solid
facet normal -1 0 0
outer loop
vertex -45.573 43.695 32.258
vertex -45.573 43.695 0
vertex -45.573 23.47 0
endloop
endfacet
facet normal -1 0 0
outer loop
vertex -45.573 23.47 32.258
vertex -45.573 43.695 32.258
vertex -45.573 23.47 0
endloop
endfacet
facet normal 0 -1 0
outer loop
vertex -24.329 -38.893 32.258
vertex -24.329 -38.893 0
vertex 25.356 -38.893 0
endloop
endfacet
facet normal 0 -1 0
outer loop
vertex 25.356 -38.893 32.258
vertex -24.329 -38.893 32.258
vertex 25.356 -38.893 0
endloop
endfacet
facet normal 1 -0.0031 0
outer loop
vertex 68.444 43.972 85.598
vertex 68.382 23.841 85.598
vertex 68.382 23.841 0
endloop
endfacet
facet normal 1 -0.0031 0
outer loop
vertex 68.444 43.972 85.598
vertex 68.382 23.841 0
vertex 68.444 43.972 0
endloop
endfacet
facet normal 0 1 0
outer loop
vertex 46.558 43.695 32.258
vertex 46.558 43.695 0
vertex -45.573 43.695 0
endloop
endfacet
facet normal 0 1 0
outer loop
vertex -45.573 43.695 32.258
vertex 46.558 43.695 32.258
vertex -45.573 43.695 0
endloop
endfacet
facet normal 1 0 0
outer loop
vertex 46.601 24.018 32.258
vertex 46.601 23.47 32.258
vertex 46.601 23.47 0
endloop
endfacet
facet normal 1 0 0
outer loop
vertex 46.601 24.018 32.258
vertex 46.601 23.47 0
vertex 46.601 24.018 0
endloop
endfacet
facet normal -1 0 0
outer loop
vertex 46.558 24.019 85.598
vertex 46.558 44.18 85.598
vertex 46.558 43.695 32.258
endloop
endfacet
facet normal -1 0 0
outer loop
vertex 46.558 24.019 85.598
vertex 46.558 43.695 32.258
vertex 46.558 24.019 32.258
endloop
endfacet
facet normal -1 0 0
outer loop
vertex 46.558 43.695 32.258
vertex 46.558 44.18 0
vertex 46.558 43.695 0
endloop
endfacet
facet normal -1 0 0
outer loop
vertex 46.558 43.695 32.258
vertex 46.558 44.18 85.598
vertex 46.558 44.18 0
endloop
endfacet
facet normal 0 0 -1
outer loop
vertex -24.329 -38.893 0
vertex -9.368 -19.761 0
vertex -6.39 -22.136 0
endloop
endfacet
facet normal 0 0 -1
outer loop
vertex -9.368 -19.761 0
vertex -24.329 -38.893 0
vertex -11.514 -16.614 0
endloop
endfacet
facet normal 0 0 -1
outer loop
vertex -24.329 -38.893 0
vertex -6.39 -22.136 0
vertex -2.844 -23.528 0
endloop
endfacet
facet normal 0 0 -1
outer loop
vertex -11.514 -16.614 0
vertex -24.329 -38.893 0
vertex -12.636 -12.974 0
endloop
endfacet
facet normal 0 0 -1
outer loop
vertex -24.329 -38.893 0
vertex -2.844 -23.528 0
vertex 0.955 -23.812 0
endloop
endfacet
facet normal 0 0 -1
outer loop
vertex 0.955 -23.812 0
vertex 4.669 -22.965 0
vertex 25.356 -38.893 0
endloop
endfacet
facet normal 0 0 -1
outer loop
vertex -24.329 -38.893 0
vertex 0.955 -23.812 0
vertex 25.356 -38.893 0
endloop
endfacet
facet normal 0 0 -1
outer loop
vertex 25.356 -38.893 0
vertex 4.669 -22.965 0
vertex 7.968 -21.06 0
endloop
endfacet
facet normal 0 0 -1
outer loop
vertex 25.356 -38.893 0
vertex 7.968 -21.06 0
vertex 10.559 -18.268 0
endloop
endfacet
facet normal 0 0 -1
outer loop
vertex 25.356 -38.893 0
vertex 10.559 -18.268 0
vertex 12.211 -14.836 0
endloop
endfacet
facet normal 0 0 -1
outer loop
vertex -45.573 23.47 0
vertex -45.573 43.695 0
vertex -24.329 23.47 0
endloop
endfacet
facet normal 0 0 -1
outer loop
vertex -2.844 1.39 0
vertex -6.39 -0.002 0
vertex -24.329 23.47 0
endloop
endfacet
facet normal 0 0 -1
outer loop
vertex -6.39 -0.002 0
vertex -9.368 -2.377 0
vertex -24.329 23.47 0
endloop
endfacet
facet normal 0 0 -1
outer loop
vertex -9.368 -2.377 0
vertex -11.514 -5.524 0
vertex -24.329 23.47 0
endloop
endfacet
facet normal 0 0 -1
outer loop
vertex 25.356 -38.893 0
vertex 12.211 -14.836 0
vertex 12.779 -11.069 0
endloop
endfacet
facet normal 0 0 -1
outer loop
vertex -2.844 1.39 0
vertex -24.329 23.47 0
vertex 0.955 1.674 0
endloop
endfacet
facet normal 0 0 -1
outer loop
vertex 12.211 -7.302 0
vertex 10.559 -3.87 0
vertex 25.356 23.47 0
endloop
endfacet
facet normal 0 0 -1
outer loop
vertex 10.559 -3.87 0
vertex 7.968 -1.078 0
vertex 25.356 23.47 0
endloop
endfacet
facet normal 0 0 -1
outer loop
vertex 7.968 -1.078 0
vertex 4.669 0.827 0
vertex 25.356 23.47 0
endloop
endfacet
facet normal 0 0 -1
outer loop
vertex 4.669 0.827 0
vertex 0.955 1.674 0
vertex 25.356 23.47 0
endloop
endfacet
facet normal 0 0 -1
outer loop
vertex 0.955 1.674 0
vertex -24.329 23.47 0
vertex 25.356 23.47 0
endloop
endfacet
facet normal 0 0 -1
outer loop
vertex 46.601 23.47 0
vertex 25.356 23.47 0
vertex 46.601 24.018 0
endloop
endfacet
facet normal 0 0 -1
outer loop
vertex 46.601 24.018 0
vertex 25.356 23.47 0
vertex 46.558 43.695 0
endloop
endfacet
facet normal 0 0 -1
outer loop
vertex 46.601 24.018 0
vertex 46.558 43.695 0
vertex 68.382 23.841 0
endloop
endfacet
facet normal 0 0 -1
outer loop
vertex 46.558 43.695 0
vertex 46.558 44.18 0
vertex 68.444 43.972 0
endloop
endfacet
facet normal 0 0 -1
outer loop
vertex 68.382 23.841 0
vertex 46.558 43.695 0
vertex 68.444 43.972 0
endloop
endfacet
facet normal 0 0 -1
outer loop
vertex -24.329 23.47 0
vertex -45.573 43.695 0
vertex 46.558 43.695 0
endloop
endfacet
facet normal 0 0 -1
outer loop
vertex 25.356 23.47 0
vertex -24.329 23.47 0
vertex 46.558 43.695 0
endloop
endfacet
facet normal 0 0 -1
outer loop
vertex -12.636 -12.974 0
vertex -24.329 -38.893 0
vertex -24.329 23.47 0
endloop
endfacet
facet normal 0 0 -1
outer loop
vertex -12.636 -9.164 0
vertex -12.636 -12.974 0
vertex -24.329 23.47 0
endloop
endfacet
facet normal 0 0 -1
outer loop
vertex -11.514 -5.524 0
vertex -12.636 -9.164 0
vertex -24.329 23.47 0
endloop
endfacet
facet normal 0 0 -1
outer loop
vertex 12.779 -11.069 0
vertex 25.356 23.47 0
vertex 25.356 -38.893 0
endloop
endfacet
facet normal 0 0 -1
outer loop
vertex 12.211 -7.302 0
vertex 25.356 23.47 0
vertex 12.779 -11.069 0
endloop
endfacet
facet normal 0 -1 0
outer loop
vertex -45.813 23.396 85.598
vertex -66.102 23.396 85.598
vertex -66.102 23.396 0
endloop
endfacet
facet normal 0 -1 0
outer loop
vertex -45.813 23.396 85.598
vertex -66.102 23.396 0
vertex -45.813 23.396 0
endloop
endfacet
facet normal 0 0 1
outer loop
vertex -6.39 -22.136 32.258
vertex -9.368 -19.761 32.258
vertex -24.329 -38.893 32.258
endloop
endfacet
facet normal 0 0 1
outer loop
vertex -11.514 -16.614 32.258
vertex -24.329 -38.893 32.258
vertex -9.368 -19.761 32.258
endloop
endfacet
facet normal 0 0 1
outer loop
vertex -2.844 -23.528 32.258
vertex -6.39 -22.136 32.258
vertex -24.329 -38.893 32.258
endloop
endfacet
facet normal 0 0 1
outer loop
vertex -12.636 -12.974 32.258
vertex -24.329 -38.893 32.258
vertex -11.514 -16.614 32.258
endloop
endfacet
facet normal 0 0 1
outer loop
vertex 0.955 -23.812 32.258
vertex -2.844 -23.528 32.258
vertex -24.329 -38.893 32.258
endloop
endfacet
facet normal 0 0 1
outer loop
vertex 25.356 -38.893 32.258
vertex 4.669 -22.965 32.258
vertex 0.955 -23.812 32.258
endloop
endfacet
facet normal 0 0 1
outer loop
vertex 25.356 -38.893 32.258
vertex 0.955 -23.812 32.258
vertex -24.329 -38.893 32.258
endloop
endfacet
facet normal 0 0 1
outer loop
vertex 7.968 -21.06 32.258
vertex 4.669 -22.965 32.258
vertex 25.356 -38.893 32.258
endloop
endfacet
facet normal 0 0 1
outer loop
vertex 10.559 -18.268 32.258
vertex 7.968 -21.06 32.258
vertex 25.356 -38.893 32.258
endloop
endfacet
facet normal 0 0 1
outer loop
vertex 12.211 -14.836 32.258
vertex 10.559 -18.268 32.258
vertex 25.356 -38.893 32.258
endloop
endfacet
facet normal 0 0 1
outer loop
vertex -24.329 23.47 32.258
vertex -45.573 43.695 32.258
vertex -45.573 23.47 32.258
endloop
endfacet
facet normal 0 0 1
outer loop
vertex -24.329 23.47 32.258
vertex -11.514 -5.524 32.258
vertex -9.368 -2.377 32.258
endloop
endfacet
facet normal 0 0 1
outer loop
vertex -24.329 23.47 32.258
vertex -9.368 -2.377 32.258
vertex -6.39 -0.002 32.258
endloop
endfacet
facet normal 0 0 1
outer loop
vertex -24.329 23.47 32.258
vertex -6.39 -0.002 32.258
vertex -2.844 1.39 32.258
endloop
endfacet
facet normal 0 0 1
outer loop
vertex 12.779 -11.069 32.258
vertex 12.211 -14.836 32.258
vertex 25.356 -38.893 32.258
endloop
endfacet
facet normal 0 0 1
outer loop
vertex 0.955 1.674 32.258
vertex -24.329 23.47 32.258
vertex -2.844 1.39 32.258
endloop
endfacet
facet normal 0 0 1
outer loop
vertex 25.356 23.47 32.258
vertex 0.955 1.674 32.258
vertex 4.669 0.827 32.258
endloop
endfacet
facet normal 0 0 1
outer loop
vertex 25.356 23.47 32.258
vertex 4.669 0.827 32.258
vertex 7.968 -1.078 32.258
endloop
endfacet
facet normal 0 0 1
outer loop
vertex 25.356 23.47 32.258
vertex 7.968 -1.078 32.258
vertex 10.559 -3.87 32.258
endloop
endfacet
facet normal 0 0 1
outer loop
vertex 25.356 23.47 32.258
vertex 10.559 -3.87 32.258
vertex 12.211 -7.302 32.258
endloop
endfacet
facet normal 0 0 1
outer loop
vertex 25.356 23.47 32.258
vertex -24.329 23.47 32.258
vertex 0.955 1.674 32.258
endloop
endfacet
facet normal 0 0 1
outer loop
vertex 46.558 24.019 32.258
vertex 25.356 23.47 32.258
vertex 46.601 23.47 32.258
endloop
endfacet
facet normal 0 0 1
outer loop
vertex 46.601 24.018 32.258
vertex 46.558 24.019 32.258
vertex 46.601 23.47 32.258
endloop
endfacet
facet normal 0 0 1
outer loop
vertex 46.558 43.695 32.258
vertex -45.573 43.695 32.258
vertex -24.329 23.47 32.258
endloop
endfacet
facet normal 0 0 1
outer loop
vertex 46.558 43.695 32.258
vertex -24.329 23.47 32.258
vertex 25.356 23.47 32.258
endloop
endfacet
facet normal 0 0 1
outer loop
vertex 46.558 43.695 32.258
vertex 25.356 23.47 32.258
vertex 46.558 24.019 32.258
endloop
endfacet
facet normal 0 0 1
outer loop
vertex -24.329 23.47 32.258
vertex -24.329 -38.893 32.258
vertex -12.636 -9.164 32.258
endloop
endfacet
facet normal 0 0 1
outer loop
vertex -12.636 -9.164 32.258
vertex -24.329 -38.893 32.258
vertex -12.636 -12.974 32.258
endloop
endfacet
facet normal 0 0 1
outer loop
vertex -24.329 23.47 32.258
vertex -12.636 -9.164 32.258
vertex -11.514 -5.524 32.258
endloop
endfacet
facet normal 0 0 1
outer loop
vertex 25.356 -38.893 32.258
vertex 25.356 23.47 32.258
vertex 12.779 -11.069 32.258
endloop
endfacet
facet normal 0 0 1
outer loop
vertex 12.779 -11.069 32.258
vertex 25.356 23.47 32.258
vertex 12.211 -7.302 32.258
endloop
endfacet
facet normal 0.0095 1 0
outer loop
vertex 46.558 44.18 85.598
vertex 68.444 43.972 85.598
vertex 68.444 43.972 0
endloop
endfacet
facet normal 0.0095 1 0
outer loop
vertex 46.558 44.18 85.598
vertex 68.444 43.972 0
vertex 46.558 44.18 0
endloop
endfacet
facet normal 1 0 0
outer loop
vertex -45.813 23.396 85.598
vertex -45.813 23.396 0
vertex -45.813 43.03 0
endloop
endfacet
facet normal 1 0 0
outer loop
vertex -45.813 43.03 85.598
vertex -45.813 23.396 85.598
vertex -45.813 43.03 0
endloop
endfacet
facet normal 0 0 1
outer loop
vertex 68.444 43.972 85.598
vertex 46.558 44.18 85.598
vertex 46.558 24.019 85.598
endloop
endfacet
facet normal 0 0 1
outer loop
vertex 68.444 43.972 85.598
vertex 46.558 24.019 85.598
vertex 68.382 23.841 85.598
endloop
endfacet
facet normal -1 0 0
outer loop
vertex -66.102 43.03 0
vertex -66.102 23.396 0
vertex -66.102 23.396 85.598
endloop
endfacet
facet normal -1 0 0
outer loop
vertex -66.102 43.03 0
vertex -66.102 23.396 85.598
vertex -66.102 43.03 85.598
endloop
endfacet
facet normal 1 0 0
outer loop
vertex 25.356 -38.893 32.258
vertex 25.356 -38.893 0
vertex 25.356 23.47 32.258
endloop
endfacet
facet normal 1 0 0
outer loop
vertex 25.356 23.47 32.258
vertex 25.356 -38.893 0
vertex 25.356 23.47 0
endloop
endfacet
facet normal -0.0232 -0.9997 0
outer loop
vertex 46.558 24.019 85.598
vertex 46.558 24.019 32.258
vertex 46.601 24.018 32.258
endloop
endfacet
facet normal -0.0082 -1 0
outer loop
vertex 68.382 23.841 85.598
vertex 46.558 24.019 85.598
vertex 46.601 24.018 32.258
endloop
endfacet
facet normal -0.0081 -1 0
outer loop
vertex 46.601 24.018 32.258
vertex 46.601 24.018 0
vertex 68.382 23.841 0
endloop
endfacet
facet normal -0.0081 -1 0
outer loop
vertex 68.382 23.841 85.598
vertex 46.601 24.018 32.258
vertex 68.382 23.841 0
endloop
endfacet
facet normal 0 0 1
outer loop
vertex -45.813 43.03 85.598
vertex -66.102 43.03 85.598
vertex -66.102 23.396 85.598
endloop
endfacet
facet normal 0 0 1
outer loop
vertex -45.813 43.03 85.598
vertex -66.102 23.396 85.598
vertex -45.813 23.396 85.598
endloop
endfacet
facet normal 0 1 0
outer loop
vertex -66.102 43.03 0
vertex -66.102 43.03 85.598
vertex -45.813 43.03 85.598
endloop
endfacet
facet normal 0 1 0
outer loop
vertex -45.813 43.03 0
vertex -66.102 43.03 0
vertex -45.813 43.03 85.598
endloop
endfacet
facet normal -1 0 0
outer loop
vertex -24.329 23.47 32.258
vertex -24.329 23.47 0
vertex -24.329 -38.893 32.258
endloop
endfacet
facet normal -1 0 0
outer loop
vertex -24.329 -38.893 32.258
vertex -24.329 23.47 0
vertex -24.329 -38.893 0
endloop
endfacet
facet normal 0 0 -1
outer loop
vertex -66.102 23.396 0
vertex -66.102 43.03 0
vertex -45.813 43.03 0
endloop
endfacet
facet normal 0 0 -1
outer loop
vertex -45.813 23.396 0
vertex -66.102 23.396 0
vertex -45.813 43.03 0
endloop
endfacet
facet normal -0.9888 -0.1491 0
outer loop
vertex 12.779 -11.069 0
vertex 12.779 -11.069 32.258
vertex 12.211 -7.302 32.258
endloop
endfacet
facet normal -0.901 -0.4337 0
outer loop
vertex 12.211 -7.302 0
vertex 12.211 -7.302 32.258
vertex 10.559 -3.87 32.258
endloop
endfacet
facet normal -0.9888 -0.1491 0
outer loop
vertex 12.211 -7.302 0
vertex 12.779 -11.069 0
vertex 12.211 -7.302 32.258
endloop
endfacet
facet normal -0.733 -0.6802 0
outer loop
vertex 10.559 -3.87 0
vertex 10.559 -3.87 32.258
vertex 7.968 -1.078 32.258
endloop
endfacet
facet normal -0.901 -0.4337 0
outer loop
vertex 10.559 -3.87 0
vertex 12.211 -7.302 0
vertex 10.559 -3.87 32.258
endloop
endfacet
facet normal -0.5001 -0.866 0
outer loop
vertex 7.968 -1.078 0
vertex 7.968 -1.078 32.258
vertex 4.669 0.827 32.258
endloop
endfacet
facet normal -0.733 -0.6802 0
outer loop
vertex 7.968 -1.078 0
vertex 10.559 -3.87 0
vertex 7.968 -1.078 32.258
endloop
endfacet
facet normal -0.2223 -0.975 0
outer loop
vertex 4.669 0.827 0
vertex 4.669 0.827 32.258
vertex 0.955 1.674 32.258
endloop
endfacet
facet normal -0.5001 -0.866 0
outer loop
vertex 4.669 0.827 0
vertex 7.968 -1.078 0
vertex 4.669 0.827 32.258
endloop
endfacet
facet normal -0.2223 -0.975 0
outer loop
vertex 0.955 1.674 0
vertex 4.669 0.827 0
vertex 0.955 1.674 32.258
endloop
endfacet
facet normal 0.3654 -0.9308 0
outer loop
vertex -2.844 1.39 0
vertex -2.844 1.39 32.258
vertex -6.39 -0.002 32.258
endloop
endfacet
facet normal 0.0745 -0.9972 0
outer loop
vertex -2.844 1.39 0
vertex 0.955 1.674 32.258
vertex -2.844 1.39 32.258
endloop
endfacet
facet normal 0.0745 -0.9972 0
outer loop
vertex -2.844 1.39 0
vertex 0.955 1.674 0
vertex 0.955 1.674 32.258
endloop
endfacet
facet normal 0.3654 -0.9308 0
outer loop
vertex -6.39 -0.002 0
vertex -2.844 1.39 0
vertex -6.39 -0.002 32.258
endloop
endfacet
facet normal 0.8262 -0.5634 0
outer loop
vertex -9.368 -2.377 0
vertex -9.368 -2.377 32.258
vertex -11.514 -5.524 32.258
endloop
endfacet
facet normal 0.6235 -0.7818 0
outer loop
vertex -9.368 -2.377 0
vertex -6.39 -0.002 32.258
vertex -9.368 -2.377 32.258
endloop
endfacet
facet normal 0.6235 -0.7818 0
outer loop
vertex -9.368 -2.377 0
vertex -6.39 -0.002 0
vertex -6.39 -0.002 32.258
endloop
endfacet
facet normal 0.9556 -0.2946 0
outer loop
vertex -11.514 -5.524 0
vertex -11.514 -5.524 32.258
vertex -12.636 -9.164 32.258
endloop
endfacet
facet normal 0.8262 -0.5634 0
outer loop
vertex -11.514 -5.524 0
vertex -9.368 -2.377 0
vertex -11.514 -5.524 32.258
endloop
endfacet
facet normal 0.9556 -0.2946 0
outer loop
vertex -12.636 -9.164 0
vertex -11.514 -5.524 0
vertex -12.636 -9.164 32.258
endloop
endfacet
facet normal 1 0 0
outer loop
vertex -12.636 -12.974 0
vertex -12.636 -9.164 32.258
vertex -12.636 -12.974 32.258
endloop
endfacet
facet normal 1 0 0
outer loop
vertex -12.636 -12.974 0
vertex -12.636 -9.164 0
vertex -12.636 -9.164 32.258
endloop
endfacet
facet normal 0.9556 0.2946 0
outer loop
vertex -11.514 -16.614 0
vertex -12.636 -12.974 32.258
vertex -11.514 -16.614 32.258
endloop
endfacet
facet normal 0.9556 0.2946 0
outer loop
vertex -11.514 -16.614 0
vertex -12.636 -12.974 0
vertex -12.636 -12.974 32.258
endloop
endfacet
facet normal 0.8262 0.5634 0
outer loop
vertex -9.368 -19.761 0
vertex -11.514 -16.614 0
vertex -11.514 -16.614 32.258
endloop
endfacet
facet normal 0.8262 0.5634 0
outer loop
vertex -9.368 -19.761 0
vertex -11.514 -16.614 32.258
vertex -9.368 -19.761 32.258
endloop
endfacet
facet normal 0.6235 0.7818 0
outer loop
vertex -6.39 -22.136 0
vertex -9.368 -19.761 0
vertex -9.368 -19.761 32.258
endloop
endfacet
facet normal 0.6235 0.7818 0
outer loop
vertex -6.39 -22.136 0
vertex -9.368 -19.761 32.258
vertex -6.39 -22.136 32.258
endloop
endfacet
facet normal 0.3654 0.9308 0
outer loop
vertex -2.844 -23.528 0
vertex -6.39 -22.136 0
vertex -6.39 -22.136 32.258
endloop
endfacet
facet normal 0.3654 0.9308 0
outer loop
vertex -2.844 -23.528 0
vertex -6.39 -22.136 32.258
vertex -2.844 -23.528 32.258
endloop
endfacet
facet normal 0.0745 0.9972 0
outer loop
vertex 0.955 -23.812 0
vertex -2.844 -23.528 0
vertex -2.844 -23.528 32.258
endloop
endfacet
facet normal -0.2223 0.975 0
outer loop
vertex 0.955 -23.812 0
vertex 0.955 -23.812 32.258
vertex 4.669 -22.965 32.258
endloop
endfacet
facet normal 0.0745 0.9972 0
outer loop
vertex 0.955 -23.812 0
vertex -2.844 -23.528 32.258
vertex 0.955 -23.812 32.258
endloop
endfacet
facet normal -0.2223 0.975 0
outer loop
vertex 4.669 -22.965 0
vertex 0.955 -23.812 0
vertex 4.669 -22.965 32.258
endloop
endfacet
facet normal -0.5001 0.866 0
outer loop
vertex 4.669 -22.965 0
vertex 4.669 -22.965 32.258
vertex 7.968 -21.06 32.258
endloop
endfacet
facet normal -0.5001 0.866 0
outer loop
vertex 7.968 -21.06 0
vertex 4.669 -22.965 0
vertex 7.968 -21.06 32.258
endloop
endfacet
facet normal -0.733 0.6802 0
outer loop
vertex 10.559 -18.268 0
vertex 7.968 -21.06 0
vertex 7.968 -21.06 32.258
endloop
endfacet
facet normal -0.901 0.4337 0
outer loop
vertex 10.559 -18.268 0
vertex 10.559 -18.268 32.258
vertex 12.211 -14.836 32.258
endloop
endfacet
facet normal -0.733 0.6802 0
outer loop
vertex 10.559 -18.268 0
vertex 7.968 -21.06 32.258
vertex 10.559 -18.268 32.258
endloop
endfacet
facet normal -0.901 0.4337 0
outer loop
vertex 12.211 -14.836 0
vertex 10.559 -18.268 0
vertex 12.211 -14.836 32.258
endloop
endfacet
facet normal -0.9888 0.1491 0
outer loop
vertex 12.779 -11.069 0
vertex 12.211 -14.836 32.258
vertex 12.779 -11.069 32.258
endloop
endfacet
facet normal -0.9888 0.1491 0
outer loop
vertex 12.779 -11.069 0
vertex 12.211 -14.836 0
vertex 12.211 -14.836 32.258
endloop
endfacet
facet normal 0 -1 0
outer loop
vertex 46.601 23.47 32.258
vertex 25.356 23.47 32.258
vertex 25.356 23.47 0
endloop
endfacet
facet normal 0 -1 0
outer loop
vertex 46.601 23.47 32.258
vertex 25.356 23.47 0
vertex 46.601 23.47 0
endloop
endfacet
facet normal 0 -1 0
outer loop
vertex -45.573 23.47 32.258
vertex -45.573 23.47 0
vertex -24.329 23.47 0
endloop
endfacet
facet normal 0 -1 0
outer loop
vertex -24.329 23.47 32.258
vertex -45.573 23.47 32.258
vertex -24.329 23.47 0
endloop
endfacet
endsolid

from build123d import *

# Parameters (mm, degrees)
F1_DEPTH = 32.258
F2_W     = 20.288836
F2_H     = 19.634359
F3_DEPTH = 85.598
F4_R     = 12.779101
F5_DEPTH = 52.07


with BuildPart() as f1:
    # F0 (on Top) → F1 (new body)
    with BuildSketch(Plane.XY):
        Polygon((-24.328522, 23.469938), (-24.328522, -38.89332), (25.356488, -38.89332), (25.356488, 23.469938), (46.601125, 23.469938), (46.601125, 43.694757), (-45.573149, 43.694757), (-45.573149, 23.469938), align=None)
    extrude(amount=F1_DEPTH)

    # F2 (on Top) → F3 (join)
    with BuildSketch(Plane.XY):
        with Locations((-55.957915, 33.212926)):
            Rectangle(F2_W, F2_H)
        Polygon((68.443626, 43.971624), (46.55816, 44.179935), (46.55816, 24.018798), (68.382069, 23.841394), align=None)
    extrude(amount=F3_DEPTH)

    # F4 (on Top) → F5 (cut)
    with BuildSketch(Plane.XY):
        with Locations((0, -11.068921)):
            Circle(F4_R)
    extrude(amount=F5_DEPTH, mode=Mode.SUBTRACT)


solid = f1.part
